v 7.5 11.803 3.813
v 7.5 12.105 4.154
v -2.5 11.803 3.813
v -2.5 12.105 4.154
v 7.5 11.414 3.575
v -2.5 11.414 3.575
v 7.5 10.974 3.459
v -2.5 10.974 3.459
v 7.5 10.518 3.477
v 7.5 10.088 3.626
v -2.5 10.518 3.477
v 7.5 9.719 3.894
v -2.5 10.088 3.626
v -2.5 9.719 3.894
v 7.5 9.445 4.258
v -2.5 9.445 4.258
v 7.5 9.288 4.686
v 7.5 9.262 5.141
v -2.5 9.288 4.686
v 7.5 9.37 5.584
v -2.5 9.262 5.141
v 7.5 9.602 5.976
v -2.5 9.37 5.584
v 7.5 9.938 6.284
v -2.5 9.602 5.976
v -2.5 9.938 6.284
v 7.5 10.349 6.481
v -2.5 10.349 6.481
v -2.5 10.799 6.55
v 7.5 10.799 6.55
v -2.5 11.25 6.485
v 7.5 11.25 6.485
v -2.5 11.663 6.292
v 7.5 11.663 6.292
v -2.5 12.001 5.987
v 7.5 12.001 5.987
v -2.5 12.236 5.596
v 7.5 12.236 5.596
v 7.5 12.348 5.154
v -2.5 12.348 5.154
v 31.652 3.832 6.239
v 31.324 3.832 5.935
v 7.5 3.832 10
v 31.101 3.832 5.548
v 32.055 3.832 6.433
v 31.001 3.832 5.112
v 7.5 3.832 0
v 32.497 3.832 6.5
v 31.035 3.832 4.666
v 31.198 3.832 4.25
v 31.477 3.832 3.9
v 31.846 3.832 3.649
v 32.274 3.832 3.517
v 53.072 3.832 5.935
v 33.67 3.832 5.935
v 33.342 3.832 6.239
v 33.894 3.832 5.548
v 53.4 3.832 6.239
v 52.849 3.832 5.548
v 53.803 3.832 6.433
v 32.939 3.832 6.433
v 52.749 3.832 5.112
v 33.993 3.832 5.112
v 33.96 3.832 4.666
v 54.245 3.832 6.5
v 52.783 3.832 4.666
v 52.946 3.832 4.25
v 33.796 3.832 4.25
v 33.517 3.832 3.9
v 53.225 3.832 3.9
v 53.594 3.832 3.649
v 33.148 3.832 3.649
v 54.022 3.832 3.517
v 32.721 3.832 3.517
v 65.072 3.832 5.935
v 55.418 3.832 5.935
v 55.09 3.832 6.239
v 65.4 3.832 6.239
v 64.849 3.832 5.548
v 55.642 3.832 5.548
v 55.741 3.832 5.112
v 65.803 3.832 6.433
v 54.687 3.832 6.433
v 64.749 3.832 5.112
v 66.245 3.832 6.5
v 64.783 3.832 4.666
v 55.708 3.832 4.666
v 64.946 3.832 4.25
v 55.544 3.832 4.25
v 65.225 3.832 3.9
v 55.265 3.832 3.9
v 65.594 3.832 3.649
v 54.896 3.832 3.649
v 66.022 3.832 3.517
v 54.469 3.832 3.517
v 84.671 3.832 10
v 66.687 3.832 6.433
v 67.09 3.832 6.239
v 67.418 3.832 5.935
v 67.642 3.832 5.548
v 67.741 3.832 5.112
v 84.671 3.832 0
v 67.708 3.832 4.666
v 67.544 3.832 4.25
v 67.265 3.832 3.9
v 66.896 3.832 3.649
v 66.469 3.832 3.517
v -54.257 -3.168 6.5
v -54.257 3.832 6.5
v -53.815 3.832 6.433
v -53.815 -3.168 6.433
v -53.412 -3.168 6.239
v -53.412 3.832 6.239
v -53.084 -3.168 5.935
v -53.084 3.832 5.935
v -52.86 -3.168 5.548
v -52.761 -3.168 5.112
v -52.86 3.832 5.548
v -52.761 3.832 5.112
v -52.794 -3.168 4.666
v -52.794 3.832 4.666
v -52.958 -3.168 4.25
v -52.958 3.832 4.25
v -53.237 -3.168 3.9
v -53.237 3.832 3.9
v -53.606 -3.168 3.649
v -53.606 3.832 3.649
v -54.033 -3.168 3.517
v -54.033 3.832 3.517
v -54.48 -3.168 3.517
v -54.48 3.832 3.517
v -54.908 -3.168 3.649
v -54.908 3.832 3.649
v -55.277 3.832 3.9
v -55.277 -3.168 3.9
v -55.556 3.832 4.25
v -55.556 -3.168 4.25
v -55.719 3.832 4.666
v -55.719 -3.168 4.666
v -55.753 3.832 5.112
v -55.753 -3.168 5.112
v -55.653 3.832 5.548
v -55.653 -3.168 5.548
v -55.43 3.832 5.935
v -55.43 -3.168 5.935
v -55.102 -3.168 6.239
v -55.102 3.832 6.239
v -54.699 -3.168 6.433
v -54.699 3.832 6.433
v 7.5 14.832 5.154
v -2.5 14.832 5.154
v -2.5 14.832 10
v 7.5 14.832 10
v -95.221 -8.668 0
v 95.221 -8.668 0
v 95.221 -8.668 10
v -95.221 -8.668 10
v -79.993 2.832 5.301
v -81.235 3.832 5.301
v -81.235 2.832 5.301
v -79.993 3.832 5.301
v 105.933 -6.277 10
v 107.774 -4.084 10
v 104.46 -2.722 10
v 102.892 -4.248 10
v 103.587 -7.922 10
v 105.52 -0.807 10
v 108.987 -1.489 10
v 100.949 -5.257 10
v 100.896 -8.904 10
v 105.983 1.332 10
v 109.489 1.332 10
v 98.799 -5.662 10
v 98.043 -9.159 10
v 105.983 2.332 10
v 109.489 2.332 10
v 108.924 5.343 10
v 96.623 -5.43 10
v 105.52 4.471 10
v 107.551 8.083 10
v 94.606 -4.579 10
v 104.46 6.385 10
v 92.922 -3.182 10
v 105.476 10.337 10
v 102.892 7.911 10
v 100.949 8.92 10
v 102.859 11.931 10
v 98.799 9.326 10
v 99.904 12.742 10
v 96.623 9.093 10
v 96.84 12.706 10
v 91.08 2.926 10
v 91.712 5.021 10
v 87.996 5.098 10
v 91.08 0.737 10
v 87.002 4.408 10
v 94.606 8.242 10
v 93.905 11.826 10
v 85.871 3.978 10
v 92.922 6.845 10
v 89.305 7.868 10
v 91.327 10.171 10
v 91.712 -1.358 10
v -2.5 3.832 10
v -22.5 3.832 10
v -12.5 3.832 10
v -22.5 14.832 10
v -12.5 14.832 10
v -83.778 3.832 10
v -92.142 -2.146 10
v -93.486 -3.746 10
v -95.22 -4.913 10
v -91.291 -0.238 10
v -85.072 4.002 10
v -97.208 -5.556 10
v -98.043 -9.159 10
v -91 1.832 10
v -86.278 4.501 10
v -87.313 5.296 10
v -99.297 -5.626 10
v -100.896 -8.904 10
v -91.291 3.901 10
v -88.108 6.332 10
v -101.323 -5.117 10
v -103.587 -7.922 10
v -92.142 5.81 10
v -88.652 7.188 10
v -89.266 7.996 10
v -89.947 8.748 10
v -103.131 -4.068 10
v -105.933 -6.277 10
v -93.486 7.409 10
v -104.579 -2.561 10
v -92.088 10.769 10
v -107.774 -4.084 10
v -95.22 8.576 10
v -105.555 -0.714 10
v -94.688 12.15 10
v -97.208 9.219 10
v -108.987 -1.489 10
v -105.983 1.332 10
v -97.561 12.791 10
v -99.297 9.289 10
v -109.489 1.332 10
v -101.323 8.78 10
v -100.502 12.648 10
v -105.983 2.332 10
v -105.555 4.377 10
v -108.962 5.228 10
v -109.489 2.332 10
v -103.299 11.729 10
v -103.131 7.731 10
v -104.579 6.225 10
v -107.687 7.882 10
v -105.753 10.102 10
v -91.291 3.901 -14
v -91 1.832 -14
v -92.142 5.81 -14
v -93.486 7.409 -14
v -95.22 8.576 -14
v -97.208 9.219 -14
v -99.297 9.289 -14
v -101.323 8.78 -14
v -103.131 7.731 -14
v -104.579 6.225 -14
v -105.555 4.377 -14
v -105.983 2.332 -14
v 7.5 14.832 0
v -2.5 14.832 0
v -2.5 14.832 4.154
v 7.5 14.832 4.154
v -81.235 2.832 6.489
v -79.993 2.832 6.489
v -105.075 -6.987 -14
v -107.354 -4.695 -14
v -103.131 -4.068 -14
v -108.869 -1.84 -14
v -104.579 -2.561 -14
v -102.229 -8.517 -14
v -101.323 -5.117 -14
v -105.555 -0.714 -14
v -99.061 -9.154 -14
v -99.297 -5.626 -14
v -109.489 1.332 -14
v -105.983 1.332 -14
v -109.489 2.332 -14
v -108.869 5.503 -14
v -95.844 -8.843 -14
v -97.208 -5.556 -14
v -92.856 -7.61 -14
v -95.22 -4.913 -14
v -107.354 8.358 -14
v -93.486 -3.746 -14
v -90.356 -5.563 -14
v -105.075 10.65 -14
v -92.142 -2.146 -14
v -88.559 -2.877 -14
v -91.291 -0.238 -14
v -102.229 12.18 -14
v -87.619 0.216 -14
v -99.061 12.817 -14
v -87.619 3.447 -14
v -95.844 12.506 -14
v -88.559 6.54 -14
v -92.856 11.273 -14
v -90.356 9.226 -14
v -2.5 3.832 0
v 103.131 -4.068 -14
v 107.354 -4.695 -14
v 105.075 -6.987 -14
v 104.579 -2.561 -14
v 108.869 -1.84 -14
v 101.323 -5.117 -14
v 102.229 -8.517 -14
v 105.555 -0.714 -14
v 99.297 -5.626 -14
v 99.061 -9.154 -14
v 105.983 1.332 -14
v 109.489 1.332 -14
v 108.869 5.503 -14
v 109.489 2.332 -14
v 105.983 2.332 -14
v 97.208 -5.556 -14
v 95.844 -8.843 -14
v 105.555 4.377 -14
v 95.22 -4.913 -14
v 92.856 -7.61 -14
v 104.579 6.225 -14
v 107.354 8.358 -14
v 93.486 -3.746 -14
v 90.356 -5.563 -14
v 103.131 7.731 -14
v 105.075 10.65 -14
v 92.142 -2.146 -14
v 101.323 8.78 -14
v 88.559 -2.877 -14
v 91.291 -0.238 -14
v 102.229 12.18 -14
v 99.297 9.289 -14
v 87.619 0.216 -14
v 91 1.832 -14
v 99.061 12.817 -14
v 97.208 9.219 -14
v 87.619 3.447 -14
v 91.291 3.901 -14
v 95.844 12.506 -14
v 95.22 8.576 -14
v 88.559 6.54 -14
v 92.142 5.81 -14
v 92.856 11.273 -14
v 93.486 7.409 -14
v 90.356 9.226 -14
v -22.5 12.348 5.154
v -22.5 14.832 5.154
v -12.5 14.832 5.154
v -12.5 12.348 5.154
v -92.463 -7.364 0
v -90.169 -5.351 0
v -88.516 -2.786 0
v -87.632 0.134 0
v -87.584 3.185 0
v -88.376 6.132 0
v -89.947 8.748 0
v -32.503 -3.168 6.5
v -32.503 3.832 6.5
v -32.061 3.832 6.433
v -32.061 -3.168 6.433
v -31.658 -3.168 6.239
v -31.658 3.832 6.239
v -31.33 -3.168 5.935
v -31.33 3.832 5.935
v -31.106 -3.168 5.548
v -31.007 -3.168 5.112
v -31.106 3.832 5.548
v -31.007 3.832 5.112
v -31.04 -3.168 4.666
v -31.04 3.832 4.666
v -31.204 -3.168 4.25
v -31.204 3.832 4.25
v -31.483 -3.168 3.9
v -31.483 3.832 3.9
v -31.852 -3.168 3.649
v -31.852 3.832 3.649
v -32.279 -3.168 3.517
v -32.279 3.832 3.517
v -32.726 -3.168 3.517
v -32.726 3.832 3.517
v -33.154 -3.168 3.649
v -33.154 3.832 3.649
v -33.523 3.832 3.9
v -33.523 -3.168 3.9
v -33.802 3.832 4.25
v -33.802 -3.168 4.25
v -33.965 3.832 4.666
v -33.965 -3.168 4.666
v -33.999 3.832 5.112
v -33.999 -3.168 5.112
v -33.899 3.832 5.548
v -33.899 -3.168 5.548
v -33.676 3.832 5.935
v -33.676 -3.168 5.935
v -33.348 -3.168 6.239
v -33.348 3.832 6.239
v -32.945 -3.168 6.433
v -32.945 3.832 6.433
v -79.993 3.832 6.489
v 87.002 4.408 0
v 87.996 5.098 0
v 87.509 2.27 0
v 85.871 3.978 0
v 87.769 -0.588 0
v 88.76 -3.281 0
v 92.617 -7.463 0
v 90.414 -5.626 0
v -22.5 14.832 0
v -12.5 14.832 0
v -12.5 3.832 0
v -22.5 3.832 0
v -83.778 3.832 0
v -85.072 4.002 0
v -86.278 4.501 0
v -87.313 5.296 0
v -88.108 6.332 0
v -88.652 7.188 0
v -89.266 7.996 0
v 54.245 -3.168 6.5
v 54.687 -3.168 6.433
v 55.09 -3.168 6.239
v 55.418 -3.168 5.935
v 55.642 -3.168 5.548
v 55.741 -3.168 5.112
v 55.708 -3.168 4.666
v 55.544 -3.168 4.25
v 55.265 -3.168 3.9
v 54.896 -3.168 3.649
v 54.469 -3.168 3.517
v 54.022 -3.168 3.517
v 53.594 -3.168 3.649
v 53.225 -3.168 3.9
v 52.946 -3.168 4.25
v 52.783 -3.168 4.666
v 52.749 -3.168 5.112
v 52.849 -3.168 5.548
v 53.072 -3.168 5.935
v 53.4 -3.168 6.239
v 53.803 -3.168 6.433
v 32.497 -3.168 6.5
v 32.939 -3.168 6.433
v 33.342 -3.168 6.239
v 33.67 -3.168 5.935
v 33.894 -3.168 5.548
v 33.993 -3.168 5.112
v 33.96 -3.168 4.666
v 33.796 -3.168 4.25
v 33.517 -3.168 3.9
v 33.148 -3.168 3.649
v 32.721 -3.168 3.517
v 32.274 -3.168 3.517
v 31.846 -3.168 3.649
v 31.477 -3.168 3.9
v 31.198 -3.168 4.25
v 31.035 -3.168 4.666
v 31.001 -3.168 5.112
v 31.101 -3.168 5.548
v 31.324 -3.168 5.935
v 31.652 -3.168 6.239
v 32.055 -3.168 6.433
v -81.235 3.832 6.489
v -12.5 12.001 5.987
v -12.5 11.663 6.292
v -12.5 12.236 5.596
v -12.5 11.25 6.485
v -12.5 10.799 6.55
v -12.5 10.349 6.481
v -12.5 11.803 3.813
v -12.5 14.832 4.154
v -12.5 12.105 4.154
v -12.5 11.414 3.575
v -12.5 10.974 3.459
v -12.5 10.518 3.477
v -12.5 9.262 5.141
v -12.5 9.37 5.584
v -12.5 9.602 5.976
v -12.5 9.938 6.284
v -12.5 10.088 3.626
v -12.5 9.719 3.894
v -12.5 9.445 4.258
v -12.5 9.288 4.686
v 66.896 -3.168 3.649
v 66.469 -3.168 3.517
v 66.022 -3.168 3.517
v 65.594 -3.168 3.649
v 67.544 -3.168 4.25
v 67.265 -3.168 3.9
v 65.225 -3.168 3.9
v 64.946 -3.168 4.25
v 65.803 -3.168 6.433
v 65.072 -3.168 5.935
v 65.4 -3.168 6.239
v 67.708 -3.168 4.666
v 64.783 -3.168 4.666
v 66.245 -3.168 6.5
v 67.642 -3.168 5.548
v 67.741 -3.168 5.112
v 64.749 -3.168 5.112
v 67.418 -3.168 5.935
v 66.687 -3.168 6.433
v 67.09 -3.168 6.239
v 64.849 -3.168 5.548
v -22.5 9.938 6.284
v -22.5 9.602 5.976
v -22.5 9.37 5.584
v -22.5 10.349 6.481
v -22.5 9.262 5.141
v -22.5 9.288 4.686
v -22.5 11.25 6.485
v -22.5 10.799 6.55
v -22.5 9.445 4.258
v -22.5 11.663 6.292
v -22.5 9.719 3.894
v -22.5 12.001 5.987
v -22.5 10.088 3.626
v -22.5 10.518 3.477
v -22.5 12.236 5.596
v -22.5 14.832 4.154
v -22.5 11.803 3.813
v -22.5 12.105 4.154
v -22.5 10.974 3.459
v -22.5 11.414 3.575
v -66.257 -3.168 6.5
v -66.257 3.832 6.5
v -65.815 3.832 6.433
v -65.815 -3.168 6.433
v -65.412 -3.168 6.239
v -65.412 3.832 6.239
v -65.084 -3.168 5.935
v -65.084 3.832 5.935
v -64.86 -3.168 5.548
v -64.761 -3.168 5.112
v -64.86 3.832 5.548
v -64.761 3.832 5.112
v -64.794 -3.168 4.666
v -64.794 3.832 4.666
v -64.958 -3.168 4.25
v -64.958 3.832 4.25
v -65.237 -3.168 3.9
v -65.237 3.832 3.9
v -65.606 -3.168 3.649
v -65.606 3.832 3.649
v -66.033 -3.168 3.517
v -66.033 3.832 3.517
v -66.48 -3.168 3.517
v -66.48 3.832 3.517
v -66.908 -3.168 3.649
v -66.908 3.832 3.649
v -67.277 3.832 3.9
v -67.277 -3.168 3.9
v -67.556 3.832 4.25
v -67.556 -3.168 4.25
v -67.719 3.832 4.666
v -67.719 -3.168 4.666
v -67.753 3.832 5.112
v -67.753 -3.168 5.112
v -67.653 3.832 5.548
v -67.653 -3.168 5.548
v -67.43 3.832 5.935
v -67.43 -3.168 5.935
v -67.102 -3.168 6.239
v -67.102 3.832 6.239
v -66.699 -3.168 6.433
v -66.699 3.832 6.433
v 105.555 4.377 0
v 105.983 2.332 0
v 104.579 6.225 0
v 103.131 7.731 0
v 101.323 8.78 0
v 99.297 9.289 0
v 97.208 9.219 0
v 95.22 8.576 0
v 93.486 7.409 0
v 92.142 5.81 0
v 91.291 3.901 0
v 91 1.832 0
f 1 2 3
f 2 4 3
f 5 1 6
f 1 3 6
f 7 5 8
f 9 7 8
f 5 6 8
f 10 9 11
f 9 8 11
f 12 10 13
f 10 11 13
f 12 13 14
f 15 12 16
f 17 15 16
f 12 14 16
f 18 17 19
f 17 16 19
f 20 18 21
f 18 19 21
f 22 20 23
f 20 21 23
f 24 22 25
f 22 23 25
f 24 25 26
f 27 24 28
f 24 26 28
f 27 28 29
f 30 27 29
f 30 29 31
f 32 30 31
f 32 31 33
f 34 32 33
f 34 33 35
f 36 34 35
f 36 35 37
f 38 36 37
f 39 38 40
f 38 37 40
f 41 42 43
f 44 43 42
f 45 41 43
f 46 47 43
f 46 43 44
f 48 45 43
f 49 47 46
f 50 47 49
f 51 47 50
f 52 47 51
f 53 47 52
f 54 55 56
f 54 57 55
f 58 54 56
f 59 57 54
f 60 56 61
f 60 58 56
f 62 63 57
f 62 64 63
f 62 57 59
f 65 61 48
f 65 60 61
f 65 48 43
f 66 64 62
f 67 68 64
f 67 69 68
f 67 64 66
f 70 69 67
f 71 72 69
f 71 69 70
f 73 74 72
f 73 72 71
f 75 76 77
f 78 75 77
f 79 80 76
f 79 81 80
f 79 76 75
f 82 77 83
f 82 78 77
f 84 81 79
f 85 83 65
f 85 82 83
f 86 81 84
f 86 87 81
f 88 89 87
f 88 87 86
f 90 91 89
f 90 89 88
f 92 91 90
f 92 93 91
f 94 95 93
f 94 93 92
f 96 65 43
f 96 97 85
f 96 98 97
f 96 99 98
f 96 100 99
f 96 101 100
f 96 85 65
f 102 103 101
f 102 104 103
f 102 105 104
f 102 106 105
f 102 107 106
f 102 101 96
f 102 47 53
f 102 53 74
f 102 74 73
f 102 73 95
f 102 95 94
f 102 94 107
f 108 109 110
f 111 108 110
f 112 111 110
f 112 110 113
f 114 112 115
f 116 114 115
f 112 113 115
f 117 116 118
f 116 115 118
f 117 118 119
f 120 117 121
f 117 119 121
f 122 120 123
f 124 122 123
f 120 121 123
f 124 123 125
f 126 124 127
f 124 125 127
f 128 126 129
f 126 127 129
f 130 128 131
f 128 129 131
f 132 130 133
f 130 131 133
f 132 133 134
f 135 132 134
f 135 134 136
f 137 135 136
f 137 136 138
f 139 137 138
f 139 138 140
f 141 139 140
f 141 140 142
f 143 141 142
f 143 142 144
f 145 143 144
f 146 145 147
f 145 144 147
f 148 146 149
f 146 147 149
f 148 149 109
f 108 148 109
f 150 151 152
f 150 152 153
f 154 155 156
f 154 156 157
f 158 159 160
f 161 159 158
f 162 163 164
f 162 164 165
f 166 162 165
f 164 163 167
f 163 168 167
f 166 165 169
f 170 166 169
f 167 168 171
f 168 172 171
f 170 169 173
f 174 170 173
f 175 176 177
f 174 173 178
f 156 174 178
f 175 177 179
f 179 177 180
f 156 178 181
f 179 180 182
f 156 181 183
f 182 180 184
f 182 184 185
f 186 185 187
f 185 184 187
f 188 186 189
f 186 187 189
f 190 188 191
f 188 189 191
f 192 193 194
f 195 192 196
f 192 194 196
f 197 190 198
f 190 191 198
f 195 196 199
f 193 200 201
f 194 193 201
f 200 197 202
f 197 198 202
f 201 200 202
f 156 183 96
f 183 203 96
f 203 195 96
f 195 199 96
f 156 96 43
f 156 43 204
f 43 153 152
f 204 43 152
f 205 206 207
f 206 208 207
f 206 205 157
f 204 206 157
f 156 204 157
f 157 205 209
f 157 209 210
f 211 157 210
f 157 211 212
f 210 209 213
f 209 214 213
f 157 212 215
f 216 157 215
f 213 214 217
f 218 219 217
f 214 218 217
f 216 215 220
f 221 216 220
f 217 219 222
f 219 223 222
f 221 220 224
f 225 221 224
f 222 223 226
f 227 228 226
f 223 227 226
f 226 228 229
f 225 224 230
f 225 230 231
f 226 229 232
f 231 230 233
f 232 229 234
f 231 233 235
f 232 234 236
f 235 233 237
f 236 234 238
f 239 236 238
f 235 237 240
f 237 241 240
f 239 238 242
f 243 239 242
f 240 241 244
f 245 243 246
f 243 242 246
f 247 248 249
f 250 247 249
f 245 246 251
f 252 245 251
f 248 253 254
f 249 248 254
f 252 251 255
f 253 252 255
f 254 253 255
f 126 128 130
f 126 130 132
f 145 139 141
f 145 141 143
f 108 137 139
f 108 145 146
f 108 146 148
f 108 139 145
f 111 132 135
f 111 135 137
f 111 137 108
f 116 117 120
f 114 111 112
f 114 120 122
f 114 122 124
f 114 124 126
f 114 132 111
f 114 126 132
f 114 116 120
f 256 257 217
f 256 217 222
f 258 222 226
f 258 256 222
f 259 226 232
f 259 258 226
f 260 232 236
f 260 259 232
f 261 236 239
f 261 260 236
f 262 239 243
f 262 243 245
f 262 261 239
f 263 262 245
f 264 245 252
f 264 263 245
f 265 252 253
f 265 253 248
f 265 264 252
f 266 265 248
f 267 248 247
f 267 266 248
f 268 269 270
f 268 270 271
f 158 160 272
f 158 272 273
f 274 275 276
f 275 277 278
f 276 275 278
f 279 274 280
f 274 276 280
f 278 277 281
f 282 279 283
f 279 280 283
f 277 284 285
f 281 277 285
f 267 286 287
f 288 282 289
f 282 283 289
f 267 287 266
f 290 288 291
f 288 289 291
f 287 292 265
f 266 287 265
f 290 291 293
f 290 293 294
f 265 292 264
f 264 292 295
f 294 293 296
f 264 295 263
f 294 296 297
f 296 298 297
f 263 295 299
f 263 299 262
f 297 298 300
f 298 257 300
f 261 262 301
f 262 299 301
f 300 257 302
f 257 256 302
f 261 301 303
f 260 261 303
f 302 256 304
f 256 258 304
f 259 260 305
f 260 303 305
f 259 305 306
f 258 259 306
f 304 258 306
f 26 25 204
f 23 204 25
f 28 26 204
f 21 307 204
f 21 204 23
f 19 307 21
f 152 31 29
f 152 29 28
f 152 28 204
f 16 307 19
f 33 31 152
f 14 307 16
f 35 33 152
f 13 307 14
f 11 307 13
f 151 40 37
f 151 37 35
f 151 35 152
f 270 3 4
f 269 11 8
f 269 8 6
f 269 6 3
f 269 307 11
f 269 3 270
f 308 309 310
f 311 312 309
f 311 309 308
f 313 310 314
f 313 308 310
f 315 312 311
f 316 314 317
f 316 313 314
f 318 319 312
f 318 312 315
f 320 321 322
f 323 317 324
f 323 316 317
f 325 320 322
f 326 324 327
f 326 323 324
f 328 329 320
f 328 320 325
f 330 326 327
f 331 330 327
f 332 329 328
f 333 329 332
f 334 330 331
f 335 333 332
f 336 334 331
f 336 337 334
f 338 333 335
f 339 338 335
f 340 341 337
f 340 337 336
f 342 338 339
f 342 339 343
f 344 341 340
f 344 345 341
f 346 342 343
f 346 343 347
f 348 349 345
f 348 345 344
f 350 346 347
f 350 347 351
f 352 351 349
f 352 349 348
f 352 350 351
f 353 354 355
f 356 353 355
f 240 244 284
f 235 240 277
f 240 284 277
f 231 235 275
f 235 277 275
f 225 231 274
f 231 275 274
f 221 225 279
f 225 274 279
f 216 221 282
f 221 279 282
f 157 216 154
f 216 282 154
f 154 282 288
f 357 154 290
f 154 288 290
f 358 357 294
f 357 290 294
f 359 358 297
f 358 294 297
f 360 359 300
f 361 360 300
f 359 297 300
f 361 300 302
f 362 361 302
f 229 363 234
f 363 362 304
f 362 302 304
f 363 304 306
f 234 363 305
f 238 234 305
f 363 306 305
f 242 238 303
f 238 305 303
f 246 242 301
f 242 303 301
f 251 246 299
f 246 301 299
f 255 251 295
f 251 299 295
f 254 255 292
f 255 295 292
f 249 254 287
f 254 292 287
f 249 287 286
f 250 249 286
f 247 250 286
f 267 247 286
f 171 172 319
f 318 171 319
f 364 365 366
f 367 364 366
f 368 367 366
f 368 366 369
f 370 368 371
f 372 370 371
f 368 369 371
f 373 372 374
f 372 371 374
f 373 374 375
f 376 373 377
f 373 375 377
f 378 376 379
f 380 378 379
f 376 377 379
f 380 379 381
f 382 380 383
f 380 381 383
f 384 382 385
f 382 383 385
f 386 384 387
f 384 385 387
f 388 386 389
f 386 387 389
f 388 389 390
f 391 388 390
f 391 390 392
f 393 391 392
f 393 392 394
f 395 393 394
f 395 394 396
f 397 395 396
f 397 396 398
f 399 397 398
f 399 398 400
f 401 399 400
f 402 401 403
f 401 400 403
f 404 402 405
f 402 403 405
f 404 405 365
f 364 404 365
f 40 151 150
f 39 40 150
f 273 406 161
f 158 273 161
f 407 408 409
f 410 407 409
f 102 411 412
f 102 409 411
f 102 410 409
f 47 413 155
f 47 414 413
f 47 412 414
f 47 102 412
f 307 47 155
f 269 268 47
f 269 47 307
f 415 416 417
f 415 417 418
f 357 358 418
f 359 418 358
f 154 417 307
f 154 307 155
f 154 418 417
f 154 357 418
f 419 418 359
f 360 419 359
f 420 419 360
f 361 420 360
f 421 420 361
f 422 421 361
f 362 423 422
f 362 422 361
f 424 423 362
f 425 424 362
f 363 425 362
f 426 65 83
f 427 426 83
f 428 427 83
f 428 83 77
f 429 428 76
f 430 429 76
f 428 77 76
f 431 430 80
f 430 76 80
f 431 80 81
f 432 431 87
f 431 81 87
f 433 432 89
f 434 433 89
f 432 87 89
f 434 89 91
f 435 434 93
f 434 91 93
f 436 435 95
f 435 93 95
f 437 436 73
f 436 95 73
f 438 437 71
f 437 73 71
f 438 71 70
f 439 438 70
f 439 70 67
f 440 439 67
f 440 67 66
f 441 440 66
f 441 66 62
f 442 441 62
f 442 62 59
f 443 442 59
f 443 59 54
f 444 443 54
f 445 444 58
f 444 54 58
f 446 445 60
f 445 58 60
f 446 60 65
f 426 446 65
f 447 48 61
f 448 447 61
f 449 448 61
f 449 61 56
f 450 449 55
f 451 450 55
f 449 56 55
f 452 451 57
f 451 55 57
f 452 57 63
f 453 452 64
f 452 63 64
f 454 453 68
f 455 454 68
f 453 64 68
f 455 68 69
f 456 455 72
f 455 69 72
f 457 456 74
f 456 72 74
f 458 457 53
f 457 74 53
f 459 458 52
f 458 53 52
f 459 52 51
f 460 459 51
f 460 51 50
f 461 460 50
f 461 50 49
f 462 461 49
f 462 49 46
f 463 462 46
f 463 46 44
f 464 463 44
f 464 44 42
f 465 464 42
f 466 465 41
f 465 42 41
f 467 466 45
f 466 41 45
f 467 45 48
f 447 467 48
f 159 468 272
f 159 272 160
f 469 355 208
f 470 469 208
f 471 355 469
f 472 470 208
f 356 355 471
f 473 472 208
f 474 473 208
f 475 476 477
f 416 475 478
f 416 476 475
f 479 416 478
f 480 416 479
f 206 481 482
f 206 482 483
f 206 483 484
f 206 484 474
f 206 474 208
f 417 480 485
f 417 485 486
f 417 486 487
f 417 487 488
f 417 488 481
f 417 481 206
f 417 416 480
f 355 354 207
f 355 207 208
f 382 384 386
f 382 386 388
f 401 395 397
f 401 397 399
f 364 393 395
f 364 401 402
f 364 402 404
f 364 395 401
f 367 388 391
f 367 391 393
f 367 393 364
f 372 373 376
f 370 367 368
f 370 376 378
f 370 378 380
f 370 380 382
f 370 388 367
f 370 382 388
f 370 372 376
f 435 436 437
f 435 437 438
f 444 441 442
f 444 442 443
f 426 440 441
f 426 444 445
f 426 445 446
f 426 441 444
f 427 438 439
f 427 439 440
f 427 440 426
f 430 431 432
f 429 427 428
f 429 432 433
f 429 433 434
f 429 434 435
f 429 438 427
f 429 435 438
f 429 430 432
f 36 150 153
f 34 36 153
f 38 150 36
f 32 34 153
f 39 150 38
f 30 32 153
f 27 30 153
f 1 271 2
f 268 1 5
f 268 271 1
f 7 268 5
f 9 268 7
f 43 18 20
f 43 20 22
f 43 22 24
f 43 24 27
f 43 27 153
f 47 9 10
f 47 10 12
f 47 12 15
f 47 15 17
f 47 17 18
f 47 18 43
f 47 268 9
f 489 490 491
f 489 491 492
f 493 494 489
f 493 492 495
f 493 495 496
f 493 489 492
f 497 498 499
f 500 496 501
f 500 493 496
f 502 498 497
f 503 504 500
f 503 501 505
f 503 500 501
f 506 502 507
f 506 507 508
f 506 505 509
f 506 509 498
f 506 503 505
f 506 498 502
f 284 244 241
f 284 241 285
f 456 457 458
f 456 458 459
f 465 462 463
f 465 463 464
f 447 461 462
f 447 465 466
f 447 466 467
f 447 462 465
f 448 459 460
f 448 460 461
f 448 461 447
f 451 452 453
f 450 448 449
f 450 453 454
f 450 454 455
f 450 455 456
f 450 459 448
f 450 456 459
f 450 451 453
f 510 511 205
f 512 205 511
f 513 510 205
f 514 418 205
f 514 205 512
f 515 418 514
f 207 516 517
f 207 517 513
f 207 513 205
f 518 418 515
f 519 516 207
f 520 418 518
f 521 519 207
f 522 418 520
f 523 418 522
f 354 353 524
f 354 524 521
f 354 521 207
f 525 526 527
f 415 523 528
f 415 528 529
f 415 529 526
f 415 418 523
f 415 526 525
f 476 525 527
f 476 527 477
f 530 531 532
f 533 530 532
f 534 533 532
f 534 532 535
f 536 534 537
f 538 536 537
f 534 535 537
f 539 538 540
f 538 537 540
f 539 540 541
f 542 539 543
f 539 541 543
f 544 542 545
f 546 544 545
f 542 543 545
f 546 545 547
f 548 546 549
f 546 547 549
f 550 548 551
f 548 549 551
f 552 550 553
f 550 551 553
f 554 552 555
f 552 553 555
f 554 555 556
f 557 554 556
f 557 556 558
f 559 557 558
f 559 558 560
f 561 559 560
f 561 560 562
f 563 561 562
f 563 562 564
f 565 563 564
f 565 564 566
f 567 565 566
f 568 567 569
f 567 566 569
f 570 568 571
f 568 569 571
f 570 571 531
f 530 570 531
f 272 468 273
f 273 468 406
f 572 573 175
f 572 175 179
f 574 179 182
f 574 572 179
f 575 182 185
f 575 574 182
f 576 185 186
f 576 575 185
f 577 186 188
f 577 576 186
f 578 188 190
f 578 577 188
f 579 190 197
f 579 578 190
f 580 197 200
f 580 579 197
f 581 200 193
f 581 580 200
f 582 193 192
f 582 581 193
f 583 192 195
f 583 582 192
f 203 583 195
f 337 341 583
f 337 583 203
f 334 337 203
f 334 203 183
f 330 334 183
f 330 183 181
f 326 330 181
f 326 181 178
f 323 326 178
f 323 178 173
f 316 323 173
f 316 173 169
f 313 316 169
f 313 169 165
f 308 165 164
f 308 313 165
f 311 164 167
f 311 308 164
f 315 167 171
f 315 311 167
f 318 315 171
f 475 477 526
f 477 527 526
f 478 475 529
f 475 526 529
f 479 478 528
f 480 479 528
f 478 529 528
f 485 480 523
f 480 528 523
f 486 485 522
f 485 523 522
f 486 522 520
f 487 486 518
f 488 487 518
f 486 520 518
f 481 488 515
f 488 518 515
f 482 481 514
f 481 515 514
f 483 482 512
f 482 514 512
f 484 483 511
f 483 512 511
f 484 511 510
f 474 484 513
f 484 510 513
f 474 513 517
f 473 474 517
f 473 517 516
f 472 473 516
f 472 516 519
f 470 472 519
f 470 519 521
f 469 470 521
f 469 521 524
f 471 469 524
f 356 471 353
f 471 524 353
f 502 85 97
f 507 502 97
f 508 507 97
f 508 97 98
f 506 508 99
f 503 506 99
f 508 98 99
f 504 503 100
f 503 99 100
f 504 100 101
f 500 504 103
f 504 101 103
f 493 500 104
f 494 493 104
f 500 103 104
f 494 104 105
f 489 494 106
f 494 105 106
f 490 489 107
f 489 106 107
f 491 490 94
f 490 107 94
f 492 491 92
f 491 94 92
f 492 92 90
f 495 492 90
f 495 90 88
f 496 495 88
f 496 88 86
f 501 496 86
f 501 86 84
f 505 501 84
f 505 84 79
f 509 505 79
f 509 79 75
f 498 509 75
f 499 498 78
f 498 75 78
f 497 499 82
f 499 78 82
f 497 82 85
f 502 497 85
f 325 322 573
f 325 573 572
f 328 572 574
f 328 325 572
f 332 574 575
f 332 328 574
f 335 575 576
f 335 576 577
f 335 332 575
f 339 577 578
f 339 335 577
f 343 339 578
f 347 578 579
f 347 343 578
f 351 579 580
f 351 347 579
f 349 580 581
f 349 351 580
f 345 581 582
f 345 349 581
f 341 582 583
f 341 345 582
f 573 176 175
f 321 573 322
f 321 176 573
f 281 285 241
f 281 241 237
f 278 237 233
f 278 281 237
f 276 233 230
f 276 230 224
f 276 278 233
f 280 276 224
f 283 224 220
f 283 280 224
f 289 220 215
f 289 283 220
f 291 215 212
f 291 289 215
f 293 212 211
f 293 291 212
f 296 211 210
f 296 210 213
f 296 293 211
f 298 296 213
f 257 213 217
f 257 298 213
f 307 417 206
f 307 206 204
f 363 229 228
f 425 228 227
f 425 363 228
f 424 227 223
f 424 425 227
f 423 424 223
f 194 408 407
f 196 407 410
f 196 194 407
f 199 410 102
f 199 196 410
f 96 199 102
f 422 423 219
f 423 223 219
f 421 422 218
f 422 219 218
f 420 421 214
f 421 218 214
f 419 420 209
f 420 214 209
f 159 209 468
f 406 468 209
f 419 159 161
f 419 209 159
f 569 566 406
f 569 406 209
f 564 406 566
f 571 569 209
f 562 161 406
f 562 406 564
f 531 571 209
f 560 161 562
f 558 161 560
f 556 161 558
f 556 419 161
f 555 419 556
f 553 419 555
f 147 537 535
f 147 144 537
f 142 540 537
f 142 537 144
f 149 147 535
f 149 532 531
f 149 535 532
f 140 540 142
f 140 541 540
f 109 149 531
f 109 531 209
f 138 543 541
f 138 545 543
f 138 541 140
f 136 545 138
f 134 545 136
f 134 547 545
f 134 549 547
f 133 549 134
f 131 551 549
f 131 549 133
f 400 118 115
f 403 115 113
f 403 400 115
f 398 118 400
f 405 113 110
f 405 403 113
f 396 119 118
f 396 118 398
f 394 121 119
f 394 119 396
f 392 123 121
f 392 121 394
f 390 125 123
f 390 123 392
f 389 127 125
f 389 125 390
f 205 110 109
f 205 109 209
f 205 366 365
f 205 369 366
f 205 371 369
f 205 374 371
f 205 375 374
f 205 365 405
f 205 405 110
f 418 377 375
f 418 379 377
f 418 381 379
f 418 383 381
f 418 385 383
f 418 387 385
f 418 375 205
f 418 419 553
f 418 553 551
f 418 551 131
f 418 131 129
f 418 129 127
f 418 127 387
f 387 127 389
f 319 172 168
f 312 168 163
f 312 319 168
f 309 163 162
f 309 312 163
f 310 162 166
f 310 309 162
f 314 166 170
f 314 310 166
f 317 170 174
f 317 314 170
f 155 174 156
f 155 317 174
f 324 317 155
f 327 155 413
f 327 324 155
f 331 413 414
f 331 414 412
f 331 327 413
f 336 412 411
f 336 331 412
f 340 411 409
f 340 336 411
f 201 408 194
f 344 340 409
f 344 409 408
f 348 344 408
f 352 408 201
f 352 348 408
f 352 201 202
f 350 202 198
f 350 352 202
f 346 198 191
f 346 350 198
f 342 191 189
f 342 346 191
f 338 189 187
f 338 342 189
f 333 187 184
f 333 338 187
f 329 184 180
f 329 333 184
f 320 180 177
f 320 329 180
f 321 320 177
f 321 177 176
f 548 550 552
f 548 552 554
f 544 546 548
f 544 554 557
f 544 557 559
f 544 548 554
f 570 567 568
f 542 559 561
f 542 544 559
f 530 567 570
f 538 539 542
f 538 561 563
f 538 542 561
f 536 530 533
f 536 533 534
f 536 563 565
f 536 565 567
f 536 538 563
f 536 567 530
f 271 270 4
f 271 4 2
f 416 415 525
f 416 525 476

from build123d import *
from build123d.topology import SkipClean

# Parameters (mm, degrees)
SKETCH2_R           = 7.5
BOSS_EXTRUDE1_DEPTH = 10
FILLET1_R           = 5
BOSS_EXTRUDE2_START = -24
SKETCH3_R           = 11
SKETCH3_R_2         = 7.5
BOSS_EXTRUDE2_DEPTH = 24
CUT_EXTRUDE1_REACH  = 135.566
SKETCH4_R           = 1.55
SKETCH6_W           = 37.11251069
SKETCH6_H           = 1
CUT_EXTRUDE3_DEPTH  = 10
SKETCH7_W           = 36.737317401
SKETCH7_H           = 1
CUT_EXTRUDE4_DEPTH  = 3
FILLET2_R           = 5
SKETCH8_R           = 1.5
CUT_EXTRUDE5_DEPTH  = 7
SKETCH9_W           = 1.241983996
SKETCH9_H           = 1.188202975
CUT_EXTRUDE6_DEPTH  = 1


with BuildPart() as part:
    # Sketch2 → Boss-Extrude1 (new body)
    with BuildSketch(Plane.XY):
        with BuildLine():
            Line((-22.5, 3.831552556), (-22.5, 14.831552556))
            Line((-22.5, 14.831552556), (-12.5, 14.831552556))
            Line((-12.5, 14.831552556), (-12.5, 3.831552556))
            Line((-12.5, 3.831552556), (-2.5, 3.831552556))
            Line((-2.5, 3.831552556), (-2.5, 14.831552556))
            Line((-2.5, 14.831552556), (7.5, 14.831552556))
            Line((7.5, 14.831552556), (7.5, 3.831552556))
            Line((7.5, 3.831552556), (88.192235936, 3.831552556))
            ThreePointArc((88.192235936, 3.831552556), (91.819805392, 9.932478429), (98.5, 12.331552556))
            ThreePointArc((98.5, 12.331552556), (109, 1.831552556), (98.5, -8.668447444))
            Line((98.5, -8.668447444), (-98.5, -8.668447444))
            ThreePointArc((-98.5, -8.668447444), (-109, 1.831552556), (-98.5, 12.331552556))
            ThreePointArc((-98.5, 12.331552556), (-91.358571571, 9.975203317), (-87.021759717, 3.831552556))
            Line((-87.021759717, 3.831552556), (-22.5, 3.831552556))
        make_face()
        with Locations((-98.5, 1.831552556)):
            Circle(SKETCH2_R, mode=Mode.SUBTRACT)
        with Locations((98.5, 1.831552556)):
            Circle(SKETCH2_R, mode=Mode.SUBTRACT)
    extrude(amount=BOSS_EXTRUDE1_DEPTH)

    # Fillet1
    fillet1_edges = [part.edges().sort_by_distance(p)[0] for p in [
        (88.192235936, 3.831552556, 5),
    ]]
    fillet(fillet1_edges, radius=FILLET1_R)

    # Sketch3 → Boss-Extrude2 (add)
    with BuildSketch(Plane.XY.offset(10).offset(BOSS_EXTRUDE2_START)):
        with Locations((-98.5, 1.831552556)):
            Circle(SKETCH3_R)
        with Locations((-98.5, 1.831552556)):
            Circle(SKETCH3_R_2, mode=Mode.SUBTRACT)
    boss_extrude2 = extrude(amount=BOSS_EXTRUDE2_DEPTH)

    # Mirror1: Boss-Extrude2 across plane
    with SkipClean():  # the faces are left unmerged after this step: merging them gives an invalid solid
        add(boss_extrude2.mirror(Plane(origin=(0, 0, 0), x_dir=(0, 0, 1), z_dir=(1, 0, 0))))

    # Cut-Extrude1: up to this face of the body (flat: up to its plane)
    cut_extrude1_end = Plane(part.part.faces().sort_by_distance((7.5, 9.331552556, 5))[0])
    # Sketch4 → Cut-Extrude1 (cut, up to the picked face)
    with BuildSketch(Plane.ZY.offset(22.5), mode=Mode.PRIVATE) as cut_extrude1_sk1:
        with Locations((5, 10.805752832)):
            Circle(SKETCH4_R)
    cut_extrude1_tool1 = split(extrude(cut_extrude1_sk1.sketch, amount=-CUT_EXTRUDE1_REACH, mode=Mode.PRIVATE), bisect_by=cut_extrude1_end, keep=Keep.BOTH, mode=Mode.PRIVATE)
    add(cut_extrude1_tool1.solids().sort_by(Axis((-22.5, 10.805753, 5), (1, 0, 0)))[0], mode=Mode.SUBTRACT)

    # Sketch6 → Cut-Extrude3 (cut)
    with BuildSketch(Plane(origin=(110, 0, 0), x_dir=(0, 0, -1), z_dir=(1, 0, 0))):
        with Locations((1.381927251, 1.831552556)):
            Rectangle(SKETCH6_W, SKETCH6_H)
    cut_extrude3 = extrude(amount=-CUT_EXTRUDE3_DEPTH, mode=Mode.SUBTRACT)

    # Mirror2: Cut-Extrude3 across plane
    add(cut_extrude3.mirror(Plane(origin=(0, 0, 0), x_dir=(0, 0, 1), z_dir=(1, 0, 0))), mode=Mode.SUBTRACT)

    # Sketch7 → Cut-Extrude4 (cut)
    with BuildSketch(Plane(origin=(0, 14.831552556, 0), x_dir=(1, 0, 0), z_dir=(0, 1, 0))):
        with Locations((-7.879171978, -4.654369626)):
            Rectangle(SKETCH7_W, SKETCH7_H)
    extrude(amount=-CUT_EXTRUDE4_DEPTH, mode=Mode.SUBTRACT)

    # Fillet2
    fillet2_edges = [part.edges().sort_by_distance(p)[0] for p in [
        (-87.021759717, 3.831552556, 5),
    ]]
    fillet(fillet2_edges, radius=FILLET2_R)

    # Sketch8 → Cut-Extrude5 (cut)
    with BuildSketch(Plane(origin=(0, 3.831552556, 0), x_dir=(1, 0, 0), z_dir=(0, 1, 0))):
        with Locations(Location((-66.25676189, -5, 0), (0, 0, 270))):
            Circle(SKETCH8_R)
        with Locations(Location((-54.25676189, -5, 0), (0, 0, 270))):
            Circle(SKETCH8_R)
        with Locations(Location((-32.502764064, -5, 0), (0, 0, 270))):
            Circle(SKETCH8_R)
        with Locations(Location((32.497235936, -5, 0), (0, 0, 270))):
            Circle(SKETCH8_R)
        with Locations(Location((54.24523811, -5, 0), (0, 0, 270))):
            Circle(SKETCH8_R)
        with Locations(Location((66.24523811, -5, 0), (0, 0, 270))):
            Circle(SKETCH8_R)
    extrude(amount=-CUT_EXTRUDE5_DEPTH, mode=Mode.SUBTRACT)

    # Sketch9 → Cut-Extrude6 (cut)
    with BuildSketch(Plane(origin=(0, 3.831552556, 0), x_dir=(1, 0, 0), z_dir=(0, 1, 0))):
        with Locations((-80.613746542, -5.894733375)):
            Rectangle(SKETCH9_W, SKETCH9_H)
    extrude(amount=-CUT_EXTRUDE6_DEPTH, mode=Mode.SUBTRACT)


solid = part.part
